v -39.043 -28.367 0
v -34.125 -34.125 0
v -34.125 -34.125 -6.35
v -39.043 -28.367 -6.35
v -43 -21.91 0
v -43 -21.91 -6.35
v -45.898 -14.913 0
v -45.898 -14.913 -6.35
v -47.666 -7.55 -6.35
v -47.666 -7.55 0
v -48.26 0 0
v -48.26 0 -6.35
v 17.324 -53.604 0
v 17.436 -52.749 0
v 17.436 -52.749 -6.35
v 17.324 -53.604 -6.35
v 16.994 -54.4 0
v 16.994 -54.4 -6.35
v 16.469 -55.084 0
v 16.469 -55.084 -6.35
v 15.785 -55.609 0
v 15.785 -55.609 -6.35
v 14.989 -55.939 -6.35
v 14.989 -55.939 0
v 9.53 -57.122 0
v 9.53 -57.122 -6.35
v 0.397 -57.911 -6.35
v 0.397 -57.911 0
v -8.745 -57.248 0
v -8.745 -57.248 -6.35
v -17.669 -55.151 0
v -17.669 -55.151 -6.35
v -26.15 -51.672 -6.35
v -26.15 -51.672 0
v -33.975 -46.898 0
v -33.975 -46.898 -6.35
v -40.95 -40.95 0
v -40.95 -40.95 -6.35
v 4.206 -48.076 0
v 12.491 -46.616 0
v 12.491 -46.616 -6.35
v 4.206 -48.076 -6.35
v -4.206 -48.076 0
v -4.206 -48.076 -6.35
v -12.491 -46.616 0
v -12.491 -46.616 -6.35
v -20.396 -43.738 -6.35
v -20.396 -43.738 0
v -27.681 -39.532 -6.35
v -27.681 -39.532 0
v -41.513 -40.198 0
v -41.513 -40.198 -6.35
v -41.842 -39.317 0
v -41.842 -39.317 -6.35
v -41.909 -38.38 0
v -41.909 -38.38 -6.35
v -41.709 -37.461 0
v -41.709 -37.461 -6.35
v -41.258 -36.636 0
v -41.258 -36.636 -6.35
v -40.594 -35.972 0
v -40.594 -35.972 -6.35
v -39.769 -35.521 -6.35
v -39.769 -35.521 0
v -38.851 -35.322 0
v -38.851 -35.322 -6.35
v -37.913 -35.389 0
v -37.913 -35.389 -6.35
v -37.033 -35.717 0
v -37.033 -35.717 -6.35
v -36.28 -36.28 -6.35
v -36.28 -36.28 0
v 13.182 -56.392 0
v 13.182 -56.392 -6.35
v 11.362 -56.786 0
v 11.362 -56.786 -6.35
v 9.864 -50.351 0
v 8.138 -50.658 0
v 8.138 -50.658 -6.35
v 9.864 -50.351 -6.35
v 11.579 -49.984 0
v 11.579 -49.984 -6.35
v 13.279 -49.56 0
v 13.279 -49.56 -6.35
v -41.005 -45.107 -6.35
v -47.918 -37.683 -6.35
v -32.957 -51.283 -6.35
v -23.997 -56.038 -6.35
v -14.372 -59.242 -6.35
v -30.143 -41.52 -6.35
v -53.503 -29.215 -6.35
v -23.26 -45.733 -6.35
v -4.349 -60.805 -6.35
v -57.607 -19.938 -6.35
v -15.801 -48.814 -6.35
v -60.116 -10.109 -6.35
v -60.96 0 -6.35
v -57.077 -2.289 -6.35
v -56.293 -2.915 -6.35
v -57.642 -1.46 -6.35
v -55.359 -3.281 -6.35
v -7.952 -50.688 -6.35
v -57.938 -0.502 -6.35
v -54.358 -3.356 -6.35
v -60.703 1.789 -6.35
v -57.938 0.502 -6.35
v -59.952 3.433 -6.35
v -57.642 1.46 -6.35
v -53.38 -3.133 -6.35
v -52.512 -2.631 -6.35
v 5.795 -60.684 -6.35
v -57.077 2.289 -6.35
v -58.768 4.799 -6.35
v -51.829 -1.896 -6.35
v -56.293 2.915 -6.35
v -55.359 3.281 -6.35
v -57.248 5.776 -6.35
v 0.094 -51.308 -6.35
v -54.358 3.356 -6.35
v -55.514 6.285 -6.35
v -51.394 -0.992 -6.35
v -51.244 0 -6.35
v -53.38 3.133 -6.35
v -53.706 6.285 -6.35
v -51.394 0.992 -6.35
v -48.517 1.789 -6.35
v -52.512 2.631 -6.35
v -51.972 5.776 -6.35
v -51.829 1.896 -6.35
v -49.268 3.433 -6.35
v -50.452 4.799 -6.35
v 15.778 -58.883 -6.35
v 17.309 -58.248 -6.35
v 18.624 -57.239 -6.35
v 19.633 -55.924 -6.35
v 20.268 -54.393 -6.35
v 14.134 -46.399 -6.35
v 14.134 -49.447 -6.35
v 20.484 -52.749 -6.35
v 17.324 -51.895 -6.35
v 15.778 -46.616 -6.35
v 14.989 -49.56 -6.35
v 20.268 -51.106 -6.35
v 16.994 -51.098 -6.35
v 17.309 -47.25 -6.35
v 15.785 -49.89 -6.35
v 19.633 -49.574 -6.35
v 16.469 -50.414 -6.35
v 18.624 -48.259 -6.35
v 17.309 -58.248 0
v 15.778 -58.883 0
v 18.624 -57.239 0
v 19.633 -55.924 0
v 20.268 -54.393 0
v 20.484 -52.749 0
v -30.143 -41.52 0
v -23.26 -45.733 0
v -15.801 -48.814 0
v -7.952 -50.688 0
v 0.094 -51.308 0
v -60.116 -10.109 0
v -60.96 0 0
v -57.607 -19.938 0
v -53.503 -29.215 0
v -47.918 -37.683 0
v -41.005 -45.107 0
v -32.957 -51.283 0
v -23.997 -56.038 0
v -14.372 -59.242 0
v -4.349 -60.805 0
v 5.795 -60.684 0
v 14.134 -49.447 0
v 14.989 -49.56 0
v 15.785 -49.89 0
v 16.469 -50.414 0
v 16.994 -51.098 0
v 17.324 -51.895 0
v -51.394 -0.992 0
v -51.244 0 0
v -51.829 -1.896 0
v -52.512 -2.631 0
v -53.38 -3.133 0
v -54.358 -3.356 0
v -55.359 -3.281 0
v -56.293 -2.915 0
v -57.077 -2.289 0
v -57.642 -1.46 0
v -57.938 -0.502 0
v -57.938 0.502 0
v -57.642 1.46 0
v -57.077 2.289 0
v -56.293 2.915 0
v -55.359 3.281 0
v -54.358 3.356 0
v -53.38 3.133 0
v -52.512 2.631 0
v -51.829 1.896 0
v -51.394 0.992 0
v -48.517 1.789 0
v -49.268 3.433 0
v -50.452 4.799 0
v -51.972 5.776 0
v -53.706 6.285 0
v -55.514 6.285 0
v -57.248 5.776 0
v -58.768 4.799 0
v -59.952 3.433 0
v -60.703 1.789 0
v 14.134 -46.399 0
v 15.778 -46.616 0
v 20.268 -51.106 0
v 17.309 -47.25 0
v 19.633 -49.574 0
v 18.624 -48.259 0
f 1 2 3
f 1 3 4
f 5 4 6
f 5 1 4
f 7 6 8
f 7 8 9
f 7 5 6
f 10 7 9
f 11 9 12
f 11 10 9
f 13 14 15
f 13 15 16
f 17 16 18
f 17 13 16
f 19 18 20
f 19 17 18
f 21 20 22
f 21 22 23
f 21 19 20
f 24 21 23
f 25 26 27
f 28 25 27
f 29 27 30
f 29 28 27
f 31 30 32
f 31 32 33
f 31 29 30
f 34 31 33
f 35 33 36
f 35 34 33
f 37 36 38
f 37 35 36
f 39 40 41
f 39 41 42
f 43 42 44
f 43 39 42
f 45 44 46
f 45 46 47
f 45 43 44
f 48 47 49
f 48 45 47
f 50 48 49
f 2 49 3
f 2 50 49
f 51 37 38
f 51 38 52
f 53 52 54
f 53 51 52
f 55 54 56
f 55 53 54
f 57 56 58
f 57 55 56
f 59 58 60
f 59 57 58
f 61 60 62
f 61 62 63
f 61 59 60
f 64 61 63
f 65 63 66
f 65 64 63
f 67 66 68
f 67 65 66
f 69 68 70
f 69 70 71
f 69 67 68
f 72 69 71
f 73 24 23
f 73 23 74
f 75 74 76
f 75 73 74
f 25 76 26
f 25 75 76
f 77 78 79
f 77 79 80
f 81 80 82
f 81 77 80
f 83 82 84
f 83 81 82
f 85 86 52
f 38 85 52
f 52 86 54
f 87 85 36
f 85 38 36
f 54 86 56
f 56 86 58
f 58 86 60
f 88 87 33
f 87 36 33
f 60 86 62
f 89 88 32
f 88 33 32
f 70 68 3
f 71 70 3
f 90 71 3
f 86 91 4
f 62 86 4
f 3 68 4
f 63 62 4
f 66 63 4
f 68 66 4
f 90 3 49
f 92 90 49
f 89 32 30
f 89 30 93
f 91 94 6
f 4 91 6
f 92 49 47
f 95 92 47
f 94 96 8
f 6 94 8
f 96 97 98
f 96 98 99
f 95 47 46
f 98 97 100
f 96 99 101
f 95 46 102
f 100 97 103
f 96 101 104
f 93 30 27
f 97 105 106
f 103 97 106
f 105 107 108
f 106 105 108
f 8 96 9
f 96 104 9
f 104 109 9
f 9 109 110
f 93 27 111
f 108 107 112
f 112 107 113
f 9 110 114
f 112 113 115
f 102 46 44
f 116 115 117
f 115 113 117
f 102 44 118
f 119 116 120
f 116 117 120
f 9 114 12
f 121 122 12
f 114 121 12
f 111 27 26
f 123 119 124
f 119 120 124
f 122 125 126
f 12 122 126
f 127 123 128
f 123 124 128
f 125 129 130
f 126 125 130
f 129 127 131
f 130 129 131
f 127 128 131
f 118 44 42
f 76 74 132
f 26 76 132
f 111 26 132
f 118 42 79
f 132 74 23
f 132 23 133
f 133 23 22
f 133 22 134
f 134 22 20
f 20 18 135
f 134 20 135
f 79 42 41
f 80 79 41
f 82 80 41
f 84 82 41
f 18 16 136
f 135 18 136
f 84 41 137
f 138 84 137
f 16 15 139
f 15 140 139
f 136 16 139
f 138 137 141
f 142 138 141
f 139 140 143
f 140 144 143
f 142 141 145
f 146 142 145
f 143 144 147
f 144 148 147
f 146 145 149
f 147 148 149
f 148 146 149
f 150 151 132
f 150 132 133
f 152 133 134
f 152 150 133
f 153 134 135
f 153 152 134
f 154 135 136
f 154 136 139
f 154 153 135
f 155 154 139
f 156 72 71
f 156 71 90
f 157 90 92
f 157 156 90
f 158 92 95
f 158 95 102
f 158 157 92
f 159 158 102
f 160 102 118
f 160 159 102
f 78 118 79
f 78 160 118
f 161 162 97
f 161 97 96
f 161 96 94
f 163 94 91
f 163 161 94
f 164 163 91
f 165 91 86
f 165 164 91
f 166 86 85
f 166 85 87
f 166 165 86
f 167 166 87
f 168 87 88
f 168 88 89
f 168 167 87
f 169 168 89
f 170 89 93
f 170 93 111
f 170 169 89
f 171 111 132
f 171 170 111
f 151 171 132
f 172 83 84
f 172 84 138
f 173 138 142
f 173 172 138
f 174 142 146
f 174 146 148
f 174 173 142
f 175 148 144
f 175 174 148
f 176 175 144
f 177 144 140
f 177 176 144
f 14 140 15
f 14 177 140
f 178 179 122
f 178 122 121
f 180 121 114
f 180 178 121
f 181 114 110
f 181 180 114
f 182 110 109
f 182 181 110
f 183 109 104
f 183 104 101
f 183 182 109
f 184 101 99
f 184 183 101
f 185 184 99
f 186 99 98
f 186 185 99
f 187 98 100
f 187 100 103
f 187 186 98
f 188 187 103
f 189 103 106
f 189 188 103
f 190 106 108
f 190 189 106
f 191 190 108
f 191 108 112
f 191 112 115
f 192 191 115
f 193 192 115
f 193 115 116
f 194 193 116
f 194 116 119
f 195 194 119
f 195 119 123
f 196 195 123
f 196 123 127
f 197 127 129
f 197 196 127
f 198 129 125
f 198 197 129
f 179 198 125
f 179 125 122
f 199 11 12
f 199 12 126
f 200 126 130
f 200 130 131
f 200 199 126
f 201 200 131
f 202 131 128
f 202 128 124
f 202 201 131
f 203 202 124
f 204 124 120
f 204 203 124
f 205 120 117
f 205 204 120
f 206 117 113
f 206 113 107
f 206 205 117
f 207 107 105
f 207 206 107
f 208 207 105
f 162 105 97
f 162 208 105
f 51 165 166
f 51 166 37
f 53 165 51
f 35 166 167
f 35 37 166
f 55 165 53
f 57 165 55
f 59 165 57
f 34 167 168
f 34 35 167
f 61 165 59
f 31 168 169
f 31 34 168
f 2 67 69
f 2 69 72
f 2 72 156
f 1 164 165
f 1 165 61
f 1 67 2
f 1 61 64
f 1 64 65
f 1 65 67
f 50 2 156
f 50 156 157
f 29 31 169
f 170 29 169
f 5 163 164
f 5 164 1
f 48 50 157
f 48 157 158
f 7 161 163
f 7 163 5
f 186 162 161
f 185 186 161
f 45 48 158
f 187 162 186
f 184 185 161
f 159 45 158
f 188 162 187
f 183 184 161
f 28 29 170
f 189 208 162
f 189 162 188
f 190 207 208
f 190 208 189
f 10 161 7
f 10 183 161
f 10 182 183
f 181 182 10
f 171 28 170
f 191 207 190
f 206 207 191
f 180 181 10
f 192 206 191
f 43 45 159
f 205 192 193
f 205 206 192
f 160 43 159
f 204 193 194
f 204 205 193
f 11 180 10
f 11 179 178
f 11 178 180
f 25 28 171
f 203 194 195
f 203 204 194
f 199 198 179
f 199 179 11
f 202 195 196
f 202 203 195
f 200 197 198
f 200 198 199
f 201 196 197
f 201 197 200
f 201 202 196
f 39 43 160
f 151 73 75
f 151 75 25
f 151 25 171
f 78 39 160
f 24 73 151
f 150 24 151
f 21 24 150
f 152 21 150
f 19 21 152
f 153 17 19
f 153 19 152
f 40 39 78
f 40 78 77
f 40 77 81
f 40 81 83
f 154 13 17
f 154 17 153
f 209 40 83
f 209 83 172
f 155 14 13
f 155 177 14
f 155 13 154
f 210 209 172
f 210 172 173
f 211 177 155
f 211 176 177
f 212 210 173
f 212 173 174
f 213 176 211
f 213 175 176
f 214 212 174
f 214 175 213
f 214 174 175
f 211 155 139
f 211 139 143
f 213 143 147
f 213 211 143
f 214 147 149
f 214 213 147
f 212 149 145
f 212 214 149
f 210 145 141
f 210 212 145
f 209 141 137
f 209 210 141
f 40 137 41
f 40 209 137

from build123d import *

# Parameters (mm, degrees)
F1_DEPTH = 6.35


with BuildPart() as f1:
    # F0 (on Top) → F1 (new body)
    with BuildSketch(Plane.XY):
        with BuildLine():
            Line((-51.2445, 0), (-48.26, 0))
            ThreePointArc((-48.26, 0), (-54.61, 6.35), (-60.96, 0))
            Line((-60.96, 0), (-57.9755, 0))
            ThreePointArc((-57.9755, 0), (-54.61, 3.3655), (-51.2445, 0))
        make_face()
        with BuildLine():
            ThreePointArc((-60.96, 0), (-54.61, -6.35), (-48.26, 0))
            Line((-48.26, 0), (-51.2445, 0))
            ThreePointArc((-51.2445, 0), (-54.61, -3.3655), (-57.9755, 0))
            Line((-57.9755, 0), (-60.96, 0))
        make_face()
        with BuildLine():
            ThreePointArc((-34.1249732601, -34.1249732601), (-44.586426239, -18.4683024459), (-48.26, 0))
            ThreePointArc((-48.26, 0), (-54.61, -6.35), (-60.96, 0))
            ThreePointArc((-60.96, 0), (-37.1100967124, -48.3628196242), (15.7776089894, -58.8828383706))
            ThreePointArc((15.7776089894, -58.8828383706), (12.4119310117, -58.8612144651), (9.5300837025, -57.1224758622))
            ThreePointArc((9.5300837025, -57.1224758622), (-17.6688931256, -55.1507929201), (-40.9499679121, -40.9499679121))
            ThreePointArc((-40.9499679121, -40.9499679121), (-40.9499679121, -36.2802347291), (-36.2802347291, -36.2802347291))
            Line((-36.2802347291, -36.2802347291), (-34.1249732601, -34.1249732601))
        make_face()
        with BuildLine():
            ThreePointArc((8.1381651285, -50.6584754246), (9.8124734412, -48.096685942), (12.4906071166, -46.6155803767))
            ThreePointArc((12.4906071166, -46.6155803767), (-12.4906071166, -46.6155803767), (-34.1249732601, -34.1249732601))
            Line((-34.1249732601, -34.1249732601), (-36.2802347291, -36.2802347291))
            ThreePointArc((-36.2802347291, -36.2802347291), (-15.8011857696, -48.8142744725), (8.1381651285, -50.6584754246))
        make_face()
        with BuildLine():
            ThreePointArc((20.484108053, -52.7492093736), (17.9997431273, -47.7114156628), (12.4906071166, -46.6155803767))
            Line((12.4906071166, -46.6155803767), (13.2794875661, -49.5597222952))
            ThreePointArc((13.2794875661, -49.5597222952), (16.1442382916, -50.129556644), (17.436108053, -52.7492093736))
            ThreePointArc((17.436108053, -52.7492093736), (16.7537607827, -54.7593396122), (14.98872854, -55.9386964521))
            Line((14.98872854, -55.9386964521), (15.7776089894, -58.8828383706))
            ThreePointArc((15.7776089894, -58.8828383706), (19.1719017639, -56.6148444479), (20.484108053, -52.7492093736))
        make_face()
        with BuildLine():
            Line((13.2794875661, -49.5597222952), (12.4906071166, -46.6155803767))
            ThreePointArc((12.4906071166, -46.6155803767), (9.8124734412, -48.096685942), (8.1381651285, -50.6584754246))
            ThreePointArc((8.1381651285, -50.6584754246), (10.7229089499, -50.1749946453), (13.2794875661, -49.5597222952))
        make_face()
        with BuildLine():
            ThreePointArc((9.5300837025, -57.1224758622), (12.4119310117, -58.8612144651), (15.7776089894, -58.8828383706))
            Line((15.7776089894, -58.8828383706), (14.98872854, -55.9386964521))
            ThreePointArc((14.98872854, -55.9386964521), (12.2736861565, -56.5964342705), (9.5300837025, -57.1224758622))
        make_face()
    extrude(amount=-F1_DEPTH)


solid = f1.part
